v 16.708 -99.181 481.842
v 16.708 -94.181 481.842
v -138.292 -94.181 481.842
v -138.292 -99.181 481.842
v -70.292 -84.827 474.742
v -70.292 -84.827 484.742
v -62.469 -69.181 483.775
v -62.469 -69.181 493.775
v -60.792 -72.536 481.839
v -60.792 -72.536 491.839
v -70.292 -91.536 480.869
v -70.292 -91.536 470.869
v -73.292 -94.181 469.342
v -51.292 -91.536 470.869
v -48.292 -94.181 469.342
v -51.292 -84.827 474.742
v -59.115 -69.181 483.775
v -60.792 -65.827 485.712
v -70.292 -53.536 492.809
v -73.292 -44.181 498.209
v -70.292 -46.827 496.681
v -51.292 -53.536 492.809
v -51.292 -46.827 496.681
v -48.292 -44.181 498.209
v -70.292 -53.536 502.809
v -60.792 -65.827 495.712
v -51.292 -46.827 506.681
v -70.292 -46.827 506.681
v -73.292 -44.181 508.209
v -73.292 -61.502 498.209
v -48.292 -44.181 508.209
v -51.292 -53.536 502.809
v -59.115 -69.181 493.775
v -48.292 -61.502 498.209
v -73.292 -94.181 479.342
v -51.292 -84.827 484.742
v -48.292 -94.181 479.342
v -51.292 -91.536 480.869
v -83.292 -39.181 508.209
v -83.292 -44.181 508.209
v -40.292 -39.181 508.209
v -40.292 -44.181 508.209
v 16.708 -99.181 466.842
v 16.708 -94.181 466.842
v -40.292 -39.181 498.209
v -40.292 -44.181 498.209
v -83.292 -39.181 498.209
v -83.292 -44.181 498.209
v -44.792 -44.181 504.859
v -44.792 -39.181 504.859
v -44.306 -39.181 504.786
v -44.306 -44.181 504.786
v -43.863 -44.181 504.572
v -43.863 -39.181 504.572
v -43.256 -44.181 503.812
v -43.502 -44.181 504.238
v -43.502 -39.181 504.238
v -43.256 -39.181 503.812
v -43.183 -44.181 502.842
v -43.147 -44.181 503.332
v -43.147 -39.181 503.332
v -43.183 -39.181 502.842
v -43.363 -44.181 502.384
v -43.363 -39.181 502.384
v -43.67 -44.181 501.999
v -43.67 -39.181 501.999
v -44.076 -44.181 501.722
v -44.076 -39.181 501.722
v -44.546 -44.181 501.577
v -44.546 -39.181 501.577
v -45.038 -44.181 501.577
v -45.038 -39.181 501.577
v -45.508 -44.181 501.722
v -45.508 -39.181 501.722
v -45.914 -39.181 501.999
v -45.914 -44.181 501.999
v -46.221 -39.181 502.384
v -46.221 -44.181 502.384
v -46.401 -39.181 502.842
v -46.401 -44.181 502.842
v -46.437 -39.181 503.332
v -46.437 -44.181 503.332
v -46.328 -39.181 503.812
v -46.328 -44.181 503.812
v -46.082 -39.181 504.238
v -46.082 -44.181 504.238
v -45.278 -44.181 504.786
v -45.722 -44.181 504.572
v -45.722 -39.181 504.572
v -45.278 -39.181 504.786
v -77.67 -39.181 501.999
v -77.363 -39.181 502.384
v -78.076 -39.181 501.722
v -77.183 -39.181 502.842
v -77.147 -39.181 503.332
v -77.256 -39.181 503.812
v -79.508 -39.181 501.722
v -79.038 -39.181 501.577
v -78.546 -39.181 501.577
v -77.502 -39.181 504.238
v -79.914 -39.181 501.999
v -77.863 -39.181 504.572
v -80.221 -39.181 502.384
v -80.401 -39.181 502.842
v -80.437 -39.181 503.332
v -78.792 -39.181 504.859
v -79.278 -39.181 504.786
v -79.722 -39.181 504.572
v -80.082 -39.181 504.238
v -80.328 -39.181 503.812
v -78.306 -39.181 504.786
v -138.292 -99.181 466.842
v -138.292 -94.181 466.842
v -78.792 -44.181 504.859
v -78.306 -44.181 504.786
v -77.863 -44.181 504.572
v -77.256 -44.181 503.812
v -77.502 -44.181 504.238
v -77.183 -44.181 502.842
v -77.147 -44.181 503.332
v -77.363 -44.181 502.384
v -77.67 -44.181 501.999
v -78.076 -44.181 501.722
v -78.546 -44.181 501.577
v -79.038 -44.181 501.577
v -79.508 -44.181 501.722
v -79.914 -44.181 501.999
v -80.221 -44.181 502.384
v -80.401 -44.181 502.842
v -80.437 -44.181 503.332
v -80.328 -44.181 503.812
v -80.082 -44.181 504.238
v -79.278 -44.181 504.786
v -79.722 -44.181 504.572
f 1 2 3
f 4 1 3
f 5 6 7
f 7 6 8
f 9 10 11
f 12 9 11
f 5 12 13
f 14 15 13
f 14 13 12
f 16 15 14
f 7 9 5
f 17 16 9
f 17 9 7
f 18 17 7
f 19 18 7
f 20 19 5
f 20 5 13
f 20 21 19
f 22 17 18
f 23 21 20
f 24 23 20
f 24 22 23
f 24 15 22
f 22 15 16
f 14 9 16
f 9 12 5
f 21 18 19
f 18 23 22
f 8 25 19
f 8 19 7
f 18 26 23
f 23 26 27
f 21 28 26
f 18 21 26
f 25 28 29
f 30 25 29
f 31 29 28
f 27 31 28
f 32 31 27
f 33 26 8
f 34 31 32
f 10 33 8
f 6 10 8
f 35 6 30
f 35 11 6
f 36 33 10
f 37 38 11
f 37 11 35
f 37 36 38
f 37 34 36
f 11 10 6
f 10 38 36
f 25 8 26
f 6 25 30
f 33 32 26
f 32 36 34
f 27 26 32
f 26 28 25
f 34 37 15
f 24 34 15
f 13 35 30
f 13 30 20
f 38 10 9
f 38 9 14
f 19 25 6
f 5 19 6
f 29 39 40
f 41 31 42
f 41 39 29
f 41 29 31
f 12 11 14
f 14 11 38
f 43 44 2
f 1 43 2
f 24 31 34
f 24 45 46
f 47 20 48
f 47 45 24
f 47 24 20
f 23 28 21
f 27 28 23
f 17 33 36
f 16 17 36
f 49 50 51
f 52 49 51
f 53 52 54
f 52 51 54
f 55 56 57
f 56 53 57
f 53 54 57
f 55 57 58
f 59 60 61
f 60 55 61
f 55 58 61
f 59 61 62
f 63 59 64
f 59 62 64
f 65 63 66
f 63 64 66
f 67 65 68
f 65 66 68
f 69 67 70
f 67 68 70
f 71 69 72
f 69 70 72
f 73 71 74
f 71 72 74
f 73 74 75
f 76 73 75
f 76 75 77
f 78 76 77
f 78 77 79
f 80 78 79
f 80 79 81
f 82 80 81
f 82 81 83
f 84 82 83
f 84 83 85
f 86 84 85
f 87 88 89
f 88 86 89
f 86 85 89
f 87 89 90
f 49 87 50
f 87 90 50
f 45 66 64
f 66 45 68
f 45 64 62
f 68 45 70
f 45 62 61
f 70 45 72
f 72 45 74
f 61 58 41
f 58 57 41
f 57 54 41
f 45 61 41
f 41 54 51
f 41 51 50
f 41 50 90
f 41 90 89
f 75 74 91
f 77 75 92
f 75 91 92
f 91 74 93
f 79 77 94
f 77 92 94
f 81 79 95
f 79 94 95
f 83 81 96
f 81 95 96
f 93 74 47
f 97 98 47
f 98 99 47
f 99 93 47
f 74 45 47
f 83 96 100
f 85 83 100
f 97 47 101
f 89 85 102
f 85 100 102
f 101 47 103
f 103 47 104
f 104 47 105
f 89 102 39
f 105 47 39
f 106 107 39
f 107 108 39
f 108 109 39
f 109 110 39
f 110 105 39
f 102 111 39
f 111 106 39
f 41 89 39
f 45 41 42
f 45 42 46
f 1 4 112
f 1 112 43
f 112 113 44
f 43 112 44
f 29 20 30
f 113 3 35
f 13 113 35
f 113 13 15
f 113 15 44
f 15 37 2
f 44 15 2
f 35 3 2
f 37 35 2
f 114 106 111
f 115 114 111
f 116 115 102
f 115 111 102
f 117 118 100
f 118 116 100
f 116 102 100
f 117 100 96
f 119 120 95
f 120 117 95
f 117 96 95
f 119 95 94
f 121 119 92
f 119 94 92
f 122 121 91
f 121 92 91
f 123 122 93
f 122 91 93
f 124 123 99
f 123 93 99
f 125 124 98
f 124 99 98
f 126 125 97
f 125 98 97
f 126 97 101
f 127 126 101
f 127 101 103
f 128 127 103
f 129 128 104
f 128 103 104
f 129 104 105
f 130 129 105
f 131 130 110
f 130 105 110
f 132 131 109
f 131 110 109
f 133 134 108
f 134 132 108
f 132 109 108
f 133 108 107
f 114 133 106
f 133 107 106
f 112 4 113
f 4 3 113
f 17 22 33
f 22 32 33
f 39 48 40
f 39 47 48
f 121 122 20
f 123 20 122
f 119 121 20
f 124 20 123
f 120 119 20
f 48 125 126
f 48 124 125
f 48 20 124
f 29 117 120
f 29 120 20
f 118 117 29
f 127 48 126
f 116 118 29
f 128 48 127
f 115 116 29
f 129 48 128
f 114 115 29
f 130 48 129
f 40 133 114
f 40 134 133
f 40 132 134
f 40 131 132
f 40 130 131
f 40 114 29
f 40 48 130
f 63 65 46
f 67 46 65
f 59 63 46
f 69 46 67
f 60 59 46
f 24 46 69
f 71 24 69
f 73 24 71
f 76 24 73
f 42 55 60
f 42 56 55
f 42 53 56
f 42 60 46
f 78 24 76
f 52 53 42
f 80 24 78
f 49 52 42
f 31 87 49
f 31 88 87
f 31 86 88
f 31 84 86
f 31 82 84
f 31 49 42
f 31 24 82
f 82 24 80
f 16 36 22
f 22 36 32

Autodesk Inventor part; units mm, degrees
ref_plane "YZ Plane" through (0, 0, 0) normal (1, 0, 0) x (0, 1, 0)
ref_plane "XZ Plane" through (0, 0, 0) normal (0, 1, 0) x (-1, 0, 0)
ref_plane "XY Plane" through (0, 0, 0) normal (0, 0, 1) x (1, 0, 0)
ref_plane "工作平面2" through (-119.683, -39.1814, 539.2089) normal (0, -1, 0) x (-0.0000021, 0, 1)
sketch "草图2" plane through (-119.683, -39.1814, 539.2089) normal (0, -1, 0) x (-0.0000021, 0, 1)
  line L0 (-31, -79.3909) -> (-41, -79.3909)
  line L1 (-41, -79.3909) -> (-41, -36.3909)
  line L2 (-41, -36.3909) -> (-31, -36.3909)
  line L3 (-31, -36.3909) -> (-31, -79.3909)
  circle A0 centre (-36, -74.8909) radius 1.65 projected
  circle A1 centre (-36, -40.8909) radius 1.65 projected
  point P0 (-539.2092, -119.6818)
  point P1 (0, 0)
  dimension "d0" = 10
  dimension "d1" = 43
  dimension "d2" = 5
  dimension "d3" = 4.5
extrude "拉伸1" add sketch "草图2" along normal blind 5
ref_plane "工作平面3" through (-119.683, -44.1814, 539.2089) normal (0, -1, 0) x (1, 0, 0.0000021)
sketch "草图4" plane through (-119.683, -44.1814, 539.2089) normal (0, -1, 0) x (1, 0, 0.0000021)
  line L0 (36.3909, -41) -> (79.3909, -41) projected
  line L1 (79.3909, -31) -> (36.3909, -31) projected
  line L2 (71.3909, -41) -> (46.3909, -41)
  line L3 (46.3909, -41) -> (46.3909, -31)
  line L4 (46.3909, -31) -> (71.3909, -31)
  line L5 (71.3909, -31) -> (71.3909, -41)
  line L6 (36.3909, -31) -> (36.3909, -41) projected
  point P0 (119.6818, -539.2092)
  point P1 (71.3909, -31)
  point P2 (46.3909, -41)
  dimension "d10" = 25
  dimension "d11" = 10
extrude "拉伸4" add sketch "草图4" along normal blind 50 contours L3 L1 L5 L0
sketch "草图5" plane through (-48.292, -94.1814, 508.2091) normal (1, 0, 0.0000021) x (0.0000021, 0, -1)
  line L0 (0, 50) -> (10, 50) projected
  line L1 (0, 50) -> (0, 0) projected
  line L2 (10, 0) -> (0, 0) projected
  line L3 (10, 50) -> (10, 0) projected
  line L4 (0, 50) -> (28.8675, 0)
  line L5 (28.8675, 0) -> (38.8675, 0)
  line L6 (38.8675, 0) -> (10, 50)
  point P0 (508.2092, 94.1814)
  point P1 (10, 32.6795)
  dimension "d29" = 30
extrude "拉伸5" add sketch "草图5" against normal blind 25 contours L6 L5 L4 L3
extrude "拉伸6" cut sketch "草图5" against normal blind 25 contours L4 L3 L2 L1
ref_plane "工作平面4" through (-40.292, -44.1814, 508.2091) normal (-0.0000021, 0, 1) x (1, 0, 0.0000021)
sketch "草图7" plane through (-40.292, -44.1814, 508.2091) normal (-0.0000021, 0, 1) x (1, 0, 0.0000021)
  line L0 (-8, 0) -> (-8, -50) projected
  line L1 (-33, 0) -> (-8, 0) projected
  line L2 (-33, -50) -> (-33, 0) projected
  line L3 (-8, -50) -> (-33, -50) projected
  line L4 (-40.6091, 5) -> (-2.3909, 5) projected
  line L5 (-33, 0) -> (-8, 0) projected
  line L6 (0, 0) -> (-8, 0) projected
  line L7 (0, 5) -> (0, 0) projected
  line L8 (0, 5) -> (-43, 5) projected
  line L9 (-43, 5) -> (-43, 0) projected
  line L10 (-33, 0) -> (-43, 0) projected
  line L11 (-8, 0) -> (-33, 0) projected
  line L12 (-33, 0) -> (-8, -50)
  line L13 (-33, -50) -> (-8, 0)
  line L14 (-31.3229, 0) -> (-8, -46.6459)
  line L15 (-33, -3.3541) -> (-9.6771, -50)
  line L16 (-33, -50) -> (-33, 0) projected
  line L17 (-33, -46.6459) -> (-9.6771, 0)
  line L18 (-8, -50) -> (-8, 0) projected
  line L19 (-8, -3.3541) -> (-31.3229, -50)
  line L20 (-30, 0) -> (-30, -50)
  line L21 (-11, -50) -> (-11, 0)
  line L22 (-30, -47.3541) -> (-11, -47.3541)
  line L23 (-30, -2.6459) -> (-11, -2.6459)
  point P0 (40.291, 44.1814)
  point P1 (-33, -46.6459)
  point P2 (-22.1771, -25)
  point P3 (-20.5, -28.3541)
  point P4 (-8, -3.3541)
  point P5 (-18.8229, -25)
  point P6 (-20.5, -21.6459)
  point P7 (-9.6771, 0)
  point P8 (-31.3229, 0)
  point P9 (-11, -40.6459)
  point P10 (-11, -9.3541)
  point P11 (-30, -9.3541)
  point P12 (-30, -40.6459)
  point P13 (-11, -2.6459)
  point P14 (-11, 0)
  point P15 (-30, 0)
  point P16 (-30, -2.6459)
  point P17 (-11, -47.3541)
  point P18 (-30, -47.3541)
  dimension "d44" = 1.5
  dimension "d45" = 1.5
  dimension "d47" = 3
  dimension "d48" = 3
extrude "拉伸8" cut sketch "草图7" against normal blind 50 contours L21 L14 L19 | L17 L14 L23 | L22 L19 L15 | L17 L20 L15
ref_plane "工作平面5" through (-48.2919, -94.1814, 469.3416) normal (0, -1, 0) x (1, 0, 0.0000021)
sketch "草图8" plane through (-48.2919, -94.1814, 469.3416) normal (0, -1, 0) x (1, 0, 0.0000021)
  line L0 (0, 10) -> (0, 0) construction
  line L1 (-25, 0) -> (-25, 10) construction
  line L2 (-90, -2.5) -> (65, -2.5)
  line L3 (65, -2.5) -> (65, 12.5)
  line L4 (65, 12.5) -> (-90, 12.5)
  line L5 (-90, 12.5) -> (-90, -2.5)
  line L6 (0, 10) -> (-25, 10) projected
  line L7 (0, 0) -> (-25, 0) projected
  line L8 (0, 10) -> (-25, 10) projected
  line L9 (0, 0) -> (-25, 0) projected
  point P0 (48.291, -469.3417)
  dimension "d40" = 155
  dimension "d41" = 65
  dimension "d49" = 15
  dimension "d50" = 2.5
extrude "拉伸9" add sketch "草图8" along normal blind 5
properties part number "起落架 新"
